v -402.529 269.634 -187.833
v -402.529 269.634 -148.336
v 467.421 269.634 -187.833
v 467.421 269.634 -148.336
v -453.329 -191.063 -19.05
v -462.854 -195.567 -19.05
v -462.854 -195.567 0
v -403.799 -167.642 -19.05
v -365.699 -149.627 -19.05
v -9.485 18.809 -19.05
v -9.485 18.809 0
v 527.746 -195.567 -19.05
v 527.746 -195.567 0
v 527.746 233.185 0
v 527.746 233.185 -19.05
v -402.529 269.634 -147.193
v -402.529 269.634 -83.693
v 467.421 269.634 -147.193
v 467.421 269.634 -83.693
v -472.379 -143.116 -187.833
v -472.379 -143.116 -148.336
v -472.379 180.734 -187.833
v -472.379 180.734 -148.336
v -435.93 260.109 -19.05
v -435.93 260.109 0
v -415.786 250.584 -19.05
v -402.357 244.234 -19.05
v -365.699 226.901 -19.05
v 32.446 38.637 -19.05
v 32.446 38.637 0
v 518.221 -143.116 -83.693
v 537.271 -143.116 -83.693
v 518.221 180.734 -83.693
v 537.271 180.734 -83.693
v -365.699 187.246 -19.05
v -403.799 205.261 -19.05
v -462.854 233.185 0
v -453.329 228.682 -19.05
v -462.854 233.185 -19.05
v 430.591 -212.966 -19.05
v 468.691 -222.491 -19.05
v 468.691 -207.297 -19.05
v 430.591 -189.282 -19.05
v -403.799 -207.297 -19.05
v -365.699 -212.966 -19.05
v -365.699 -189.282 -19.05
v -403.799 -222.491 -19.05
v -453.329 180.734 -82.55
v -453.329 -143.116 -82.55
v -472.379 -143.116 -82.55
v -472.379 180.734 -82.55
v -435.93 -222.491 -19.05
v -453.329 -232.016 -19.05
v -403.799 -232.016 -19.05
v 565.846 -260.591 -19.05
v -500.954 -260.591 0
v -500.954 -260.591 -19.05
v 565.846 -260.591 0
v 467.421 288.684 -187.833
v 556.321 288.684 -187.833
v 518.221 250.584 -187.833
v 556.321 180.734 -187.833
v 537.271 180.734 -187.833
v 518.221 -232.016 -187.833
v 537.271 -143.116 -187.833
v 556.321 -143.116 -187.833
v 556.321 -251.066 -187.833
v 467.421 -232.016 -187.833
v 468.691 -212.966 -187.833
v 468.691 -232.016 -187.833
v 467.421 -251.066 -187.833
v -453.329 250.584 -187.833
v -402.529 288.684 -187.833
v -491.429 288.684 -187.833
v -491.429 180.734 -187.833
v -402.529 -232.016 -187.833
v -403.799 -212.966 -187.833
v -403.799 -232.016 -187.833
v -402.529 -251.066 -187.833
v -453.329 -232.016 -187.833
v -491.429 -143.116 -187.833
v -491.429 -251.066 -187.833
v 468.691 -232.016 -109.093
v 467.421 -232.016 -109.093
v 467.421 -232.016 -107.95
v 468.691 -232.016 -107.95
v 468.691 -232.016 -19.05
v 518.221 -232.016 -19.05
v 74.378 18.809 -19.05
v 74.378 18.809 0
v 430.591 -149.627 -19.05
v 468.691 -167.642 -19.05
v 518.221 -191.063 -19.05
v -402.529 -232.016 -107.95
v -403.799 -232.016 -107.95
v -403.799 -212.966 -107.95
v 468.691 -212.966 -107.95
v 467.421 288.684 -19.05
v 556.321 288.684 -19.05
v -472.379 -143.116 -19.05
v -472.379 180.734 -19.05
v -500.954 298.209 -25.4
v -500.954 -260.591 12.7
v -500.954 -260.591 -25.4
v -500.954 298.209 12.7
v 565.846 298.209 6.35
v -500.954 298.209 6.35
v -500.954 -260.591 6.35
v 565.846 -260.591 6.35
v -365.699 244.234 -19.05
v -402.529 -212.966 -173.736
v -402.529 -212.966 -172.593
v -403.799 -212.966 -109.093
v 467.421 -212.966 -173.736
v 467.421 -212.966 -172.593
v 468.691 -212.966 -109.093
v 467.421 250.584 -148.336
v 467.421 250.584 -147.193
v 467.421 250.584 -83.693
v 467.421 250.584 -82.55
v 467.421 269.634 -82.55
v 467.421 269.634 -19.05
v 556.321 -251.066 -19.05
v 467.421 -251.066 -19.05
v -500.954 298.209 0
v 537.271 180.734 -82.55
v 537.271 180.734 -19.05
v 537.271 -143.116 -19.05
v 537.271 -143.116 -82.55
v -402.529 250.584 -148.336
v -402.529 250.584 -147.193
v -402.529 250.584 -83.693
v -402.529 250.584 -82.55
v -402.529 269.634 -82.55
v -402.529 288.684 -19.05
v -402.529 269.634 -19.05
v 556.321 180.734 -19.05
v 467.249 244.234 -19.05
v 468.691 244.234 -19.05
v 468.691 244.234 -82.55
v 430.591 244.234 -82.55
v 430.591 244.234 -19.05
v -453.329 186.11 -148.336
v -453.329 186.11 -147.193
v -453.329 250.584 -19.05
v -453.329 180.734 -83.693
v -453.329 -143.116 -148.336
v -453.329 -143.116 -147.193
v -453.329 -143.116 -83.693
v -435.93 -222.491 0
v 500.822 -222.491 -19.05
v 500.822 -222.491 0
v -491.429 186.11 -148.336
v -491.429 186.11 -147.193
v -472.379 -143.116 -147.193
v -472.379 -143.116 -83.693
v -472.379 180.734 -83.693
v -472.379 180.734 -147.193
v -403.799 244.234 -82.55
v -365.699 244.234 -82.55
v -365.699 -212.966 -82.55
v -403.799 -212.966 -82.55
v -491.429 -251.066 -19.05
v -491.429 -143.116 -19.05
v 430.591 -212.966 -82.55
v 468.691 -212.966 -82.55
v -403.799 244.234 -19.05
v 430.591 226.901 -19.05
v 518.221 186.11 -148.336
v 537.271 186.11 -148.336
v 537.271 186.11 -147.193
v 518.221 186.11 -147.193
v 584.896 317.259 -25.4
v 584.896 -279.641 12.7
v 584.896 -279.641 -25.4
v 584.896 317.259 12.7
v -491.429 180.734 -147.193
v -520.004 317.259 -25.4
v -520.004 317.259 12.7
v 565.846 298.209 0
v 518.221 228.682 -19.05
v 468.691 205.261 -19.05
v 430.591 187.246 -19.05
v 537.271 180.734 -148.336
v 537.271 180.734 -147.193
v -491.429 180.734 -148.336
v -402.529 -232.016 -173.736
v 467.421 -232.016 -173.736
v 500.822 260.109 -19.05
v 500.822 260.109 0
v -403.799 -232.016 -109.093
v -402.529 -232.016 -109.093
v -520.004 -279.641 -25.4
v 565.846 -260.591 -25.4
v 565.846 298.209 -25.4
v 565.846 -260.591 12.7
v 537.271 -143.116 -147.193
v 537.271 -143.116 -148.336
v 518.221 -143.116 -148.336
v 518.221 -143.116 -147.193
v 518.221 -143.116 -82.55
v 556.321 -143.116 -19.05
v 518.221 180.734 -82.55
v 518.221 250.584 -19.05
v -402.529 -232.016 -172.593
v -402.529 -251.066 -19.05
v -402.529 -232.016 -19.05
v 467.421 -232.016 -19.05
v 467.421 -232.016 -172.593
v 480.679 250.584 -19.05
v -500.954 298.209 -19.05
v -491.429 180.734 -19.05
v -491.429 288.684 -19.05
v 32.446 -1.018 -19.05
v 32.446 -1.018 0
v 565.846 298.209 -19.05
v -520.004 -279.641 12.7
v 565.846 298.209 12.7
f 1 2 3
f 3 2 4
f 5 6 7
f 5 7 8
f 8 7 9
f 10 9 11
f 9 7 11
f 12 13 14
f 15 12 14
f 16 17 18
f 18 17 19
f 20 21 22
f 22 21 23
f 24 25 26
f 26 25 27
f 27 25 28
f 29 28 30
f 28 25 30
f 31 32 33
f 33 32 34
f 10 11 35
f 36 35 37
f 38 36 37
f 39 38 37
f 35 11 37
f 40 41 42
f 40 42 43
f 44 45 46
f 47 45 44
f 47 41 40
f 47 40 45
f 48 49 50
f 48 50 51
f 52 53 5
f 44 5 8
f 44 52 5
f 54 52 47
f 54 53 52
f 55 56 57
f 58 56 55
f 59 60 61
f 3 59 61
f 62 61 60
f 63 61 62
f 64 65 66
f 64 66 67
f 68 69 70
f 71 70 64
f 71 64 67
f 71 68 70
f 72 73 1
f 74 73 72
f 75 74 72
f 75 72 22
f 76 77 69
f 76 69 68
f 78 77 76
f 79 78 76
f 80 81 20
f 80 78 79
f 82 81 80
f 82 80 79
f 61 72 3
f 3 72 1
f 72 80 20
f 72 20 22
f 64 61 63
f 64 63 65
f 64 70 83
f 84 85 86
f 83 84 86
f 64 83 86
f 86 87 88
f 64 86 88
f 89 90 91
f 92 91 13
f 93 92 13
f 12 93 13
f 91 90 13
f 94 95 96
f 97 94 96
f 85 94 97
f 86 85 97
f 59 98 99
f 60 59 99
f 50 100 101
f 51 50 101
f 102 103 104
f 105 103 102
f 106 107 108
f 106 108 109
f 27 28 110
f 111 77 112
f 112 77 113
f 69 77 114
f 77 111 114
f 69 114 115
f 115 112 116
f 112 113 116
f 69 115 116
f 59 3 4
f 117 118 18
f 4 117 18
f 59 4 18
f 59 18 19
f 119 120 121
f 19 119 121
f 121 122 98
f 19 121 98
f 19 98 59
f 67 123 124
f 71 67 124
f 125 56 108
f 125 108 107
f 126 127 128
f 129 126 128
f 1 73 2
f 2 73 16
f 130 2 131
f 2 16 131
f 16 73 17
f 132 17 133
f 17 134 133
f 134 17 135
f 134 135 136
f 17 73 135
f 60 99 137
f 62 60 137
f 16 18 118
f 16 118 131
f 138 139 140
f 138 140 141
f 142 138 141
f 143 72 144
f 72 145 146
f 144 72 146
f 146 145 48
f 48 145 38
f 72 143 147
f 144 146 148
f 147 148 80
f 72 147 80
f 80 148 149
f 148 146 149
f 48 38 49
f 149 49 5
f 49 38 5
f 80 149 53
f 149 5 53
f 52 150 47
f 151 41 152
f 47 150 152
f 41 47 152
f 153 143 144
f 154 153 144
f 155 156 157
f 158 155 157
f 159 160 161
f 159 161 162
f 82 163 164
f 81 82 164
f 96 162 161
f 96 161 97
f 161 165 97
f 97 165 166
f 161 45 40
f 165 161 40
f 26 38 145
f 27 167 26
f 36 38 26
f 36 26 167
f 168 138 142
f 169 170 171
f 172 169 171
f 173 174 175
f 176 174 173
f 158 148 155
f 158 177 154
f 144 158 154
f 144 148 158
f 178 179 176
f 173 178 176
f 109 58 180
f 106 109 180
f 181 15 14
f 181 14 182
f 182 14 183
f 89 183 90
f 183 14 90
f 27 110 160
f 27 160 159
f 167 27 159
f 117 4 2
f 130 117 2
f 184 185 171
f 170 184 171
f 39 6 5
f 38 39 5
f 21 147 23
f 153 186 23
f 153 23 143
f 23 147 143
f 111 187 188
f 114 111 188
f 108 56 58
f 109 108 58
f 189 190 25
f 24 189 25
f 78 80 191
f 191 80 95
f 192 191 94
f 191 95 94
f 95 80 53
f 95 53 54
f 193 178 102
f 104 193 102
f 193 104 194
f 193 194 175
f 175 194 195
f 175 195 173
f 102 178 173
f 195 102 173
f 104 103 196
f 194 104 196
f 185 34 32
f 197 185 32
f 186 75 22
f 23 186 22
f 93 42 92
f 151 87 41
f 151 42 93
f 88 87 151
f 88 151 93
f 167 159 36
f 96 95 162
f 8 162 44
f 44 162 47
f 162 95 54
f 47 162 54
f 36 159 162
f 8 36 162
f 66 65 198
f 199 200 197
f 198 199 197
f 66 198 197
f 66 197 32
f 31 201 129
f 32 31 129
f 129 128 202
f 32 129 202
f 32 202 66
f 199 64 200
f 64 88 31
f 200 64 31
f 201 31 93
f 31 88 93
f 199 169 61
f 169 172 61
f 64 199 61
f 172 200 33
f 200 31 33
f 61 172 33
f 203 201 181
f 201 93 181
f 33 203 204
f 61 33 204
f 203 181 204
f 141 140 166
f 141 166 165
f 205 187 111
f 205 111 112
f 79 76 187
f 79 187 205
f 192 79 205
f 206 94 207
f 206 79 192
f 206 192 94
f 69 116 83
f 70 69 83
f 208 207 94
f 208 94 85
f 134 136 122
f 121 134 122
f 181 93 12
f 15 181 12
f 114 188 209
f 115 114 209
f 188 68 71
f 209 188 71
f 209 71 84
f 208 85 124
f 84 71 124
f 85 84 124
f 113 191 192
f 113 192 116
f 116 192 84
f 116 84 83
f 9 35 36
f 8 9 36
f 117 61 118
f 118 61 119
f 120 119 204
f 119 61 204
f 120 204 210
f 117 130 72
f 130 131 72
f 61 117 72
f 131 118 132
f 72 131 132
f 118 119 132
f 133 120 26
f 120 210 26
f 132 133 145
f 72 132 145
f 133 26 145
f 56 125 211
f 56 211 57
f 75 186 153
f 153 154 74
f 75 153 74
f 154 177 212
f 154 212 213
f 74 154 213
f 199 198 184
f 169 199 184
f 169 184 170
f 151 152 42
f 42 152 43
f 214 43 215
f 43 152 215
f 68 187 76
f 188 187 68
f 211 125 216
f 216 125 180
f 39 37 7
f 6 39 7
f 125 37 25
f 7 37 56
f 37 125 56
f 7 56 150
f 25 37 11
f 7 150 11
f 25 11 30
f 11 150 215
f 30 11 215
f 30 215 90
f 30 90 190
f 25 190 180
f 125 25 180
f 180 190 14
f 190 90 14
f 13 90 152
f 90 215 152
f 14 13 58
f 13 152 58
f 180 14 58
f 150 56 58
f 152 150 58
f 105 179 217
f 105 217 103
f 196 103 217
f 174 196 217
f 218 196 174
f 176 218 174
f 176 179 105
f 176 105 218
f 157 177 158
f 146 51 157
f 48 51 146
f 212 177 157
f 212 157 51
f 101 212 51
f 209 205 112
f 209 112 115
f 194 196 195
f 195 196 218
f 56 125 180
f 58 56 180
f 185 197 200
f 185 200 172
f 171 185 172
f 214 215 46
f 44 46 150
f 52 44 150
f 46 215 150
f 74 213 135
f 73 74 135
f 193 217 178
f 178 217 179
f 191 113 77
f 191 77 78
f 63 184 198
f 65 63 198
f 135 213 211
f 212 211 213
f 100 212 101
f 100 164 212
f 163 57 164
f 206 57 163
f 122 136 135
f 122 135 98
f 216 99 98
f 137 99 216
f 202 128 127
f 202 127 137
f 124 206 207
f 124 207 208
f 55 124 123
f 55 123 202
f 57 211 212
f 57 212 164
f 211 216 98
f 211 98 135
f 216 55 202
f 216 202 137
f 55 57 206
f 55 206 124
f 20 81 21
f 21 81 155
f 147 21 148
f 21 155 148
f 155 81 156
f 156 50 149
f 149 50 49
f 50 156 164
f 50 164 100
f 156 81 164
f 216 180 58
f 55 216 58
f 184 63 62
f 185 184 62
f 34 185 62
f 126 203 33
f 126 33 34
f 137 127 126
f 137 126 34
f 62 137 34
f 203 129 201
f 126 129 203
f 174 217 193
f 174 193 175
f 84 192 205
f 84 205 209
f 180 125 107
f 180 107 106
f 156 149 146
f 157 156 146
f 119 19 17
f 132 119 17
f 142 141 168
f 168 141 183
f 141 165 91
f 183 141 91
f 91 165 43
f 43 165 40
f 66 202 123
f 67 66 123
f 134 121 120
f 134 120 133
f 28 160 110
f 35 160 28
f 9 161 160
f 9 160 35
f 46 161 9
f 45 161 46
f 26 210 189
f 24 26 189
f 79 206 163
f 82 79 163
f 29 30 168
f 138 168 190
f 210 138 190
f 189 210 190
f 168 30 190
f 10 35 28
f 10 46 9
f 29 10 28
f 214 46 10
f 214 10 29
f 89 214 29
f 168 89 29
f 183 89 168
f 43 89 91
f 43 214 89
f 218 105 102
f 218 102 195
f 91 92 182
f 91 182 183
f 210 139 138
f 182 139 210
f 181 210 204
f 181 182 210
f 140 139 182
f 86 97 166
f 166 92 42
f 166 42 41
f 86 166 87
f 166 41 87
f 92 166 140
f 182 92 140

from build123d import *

# Parameters (mm, degrees)
F0_W      = 1066.8
F0_H      = 558.8
F1_DEPTH  = 6.35
F3_W      = 1104.9
F3_H      = 596.9
F3_W_2    = 1066.8
F3_H_2    = 558.8
F4_DEPTH  = 38.1
F5_W      = 1066.8
F5_H      = 558.8
F6_DEPTH  = 19.05
F7_W      = 872.49
F7_H      = 19.05
F8_DEPTH  = 88.9
F9_W      = 38.1
F9_H      = 63.5
F10_DEPTH = 457.2
F11_W     = 19.05
F11_H     = 88.9
F12_DEPTH = 419.1
F14_DEPTH = 192.786
F15_W     = 323.85
F15_H     = 1.143
F15_W_2   = 329.2250932205
F16_DEPTH = 1219.2
F17_W     = 869.95
F17_H     = 1.143
F18_DEPTH = 25.4
F20_W     = 872.49
F20_H     = 19.05
F21_DEPTH = 128.143
F22_W     = 869.95
F22_H     = 1.143
F23_DEPTH = 25.4
F24_W     = 38.1
F24_H     = 88.9
F25_DEPTH = 226.314
F26_W     = 558.8
F26_H     = 381
F27_DEPTH = 1397


# Not quite as in the source:
# - a feature of the source that left no trace in its solid (it failed there, or was rolled back) is left out


with BuildPart() as f1:
    # F0 (on Top) → F1 (new body)
    with BuildSketch(Plane.XY):
        with Locations((32.4463618145, 18.8094943296)):
            Rectangle(F0_W, F0_H)
    extrude(amount=F1_DEPTH)


with BuildPart() as f4:
    # F3 (on offset) → F4 (new body)
    with BuildSketch(Plane.XY.offset(12.7)):
        with Locations((32.4463618145, 18.8094943296)):
            Rectangle(F3_W, F3_H)
        with Locations((32.4463618145, 18.8094943296)):
            Rectangle(F3_W_2, F3_H_2, mode=Mode.SUBTRACT)
    extrude(amount=-F4_DEPTH)


with BuildPart() as f6:
    # F5 (on face) → F6 (new body)
    with BuildSketch(Plane(origin=(0, 0, 0), x_dir=(1, 0, 0), z_dir=(0, 0, -1))):
        with Locations((32.4463618145, -18.8094943296)):
            Rectangle(F5_W, F5_H)
        Polygon((-462.8536381855, -233.1854943296), (-462.8536381855, 195.5665056704), (-9.4854419759, -18.8094943296), align=None, mode=Mode.SUBTRACT)
        Polygon((32.4463618145, -38.6370262221), (500.8223618145, -260.1094943296), (-435.9296381855, -260.1094943296), align=None, mode=Mode.SUBTRACT)
        Polygon((-435.9296381855, 222.4905056704), (500.8223618145, 222.4905056704), (32.4463618145, 1.0180375628), align=None, mode=Mode.SUBTRACT)
        Polygon((74.378165605, -18.8094943296), (527.7463618145, 195.5665056704), (527.7463618145, -233.1854943296), align=None, mode=Mode.SUBTRACT)
    extrude(amount=F6_DEPTH)

    # F7 (on face) → F8 (join)
    with BuildSketch(Plane(origin=(0, 0, -19.05), x_dir=(1, 0, 0), z_dir=(0, 0, -1))):
        with Locations((32.4463618145, 222.4905056704)):
            Rectangle(F7_W, F7_H)
    extrude(amount=F8_DEPTH)

    # F9 (on face) → F10 (join)
    with BuildSketch(Plane(origin=(0, -212.9655056704, 0), x_dir=(-1, 0, 0), z_dir=(0, 1, 0))):
        with Locations((384.7486381855, -50.8)):
            Rectangle(F9_W, F9_H)
        with Locations((-449.6413618145, -50.8)):
            Rectangle(F9_W, F9_H)
    extrude(amount=F10_DEPTH)

    # F11 (on face) → F12 (join)
    with BuildSketch(Plane(origin=(0, 0, -19.05), x_dir=(1, 0, 0), z_dir=(0, 0, -1))):
        Polygon((-402.5286381855, 251.0655056704), (-491.4286381855, 251.0655056704), (-491.4286381855, 232.0155056704), (-472.3786381855, 232.0155056704), (-402.5286381855, 232.0155056704), align=None)
        with Locations((-481.9036381855, 187.5655056704)):
            Rectangle(F11_W, F11_H)
        Polygon((-491.4286381855, -269.6344943296), (-491.4286381855, -288.6844943296), (-402.5286381855, -288.6844943296), (-402.5286381855, -269.6344943296), (-472.3786381855, -269.6344943296), align=None)
        with Locations((-481.9036381855, -225.1844943296)):
            Rectangle(F11_W, F11_H)
        Polygon((467.4213618145, -288.6844943296), (556.3213618145, -288.6844943296), (556.3213618145, -269.6344943296), (537.2713618145, -269.6344943296), (467.4213618145, -269.6344943296), align=None)
        with Locations((546.7963618145, -225.1844943296)):
            Rectangle(F11_W, F11_H)
        with Locations((546.7963618145, 187.5655056704)):
            Rectangle(F11_W, F11_H)
        Polygon((537.2713618145, 232.0155056704), (556.3213618145, 232.0155056704), (556.3213618145, 251.0655056704), (467.4213618145, 251.0655056704), (467.4213618145, 232.0155056704), align=None)
    extrude(amount=F12_DEPTH)

    # F13 (on face) → F14 (join)
    with BuildSketch(Plane(origin=(0, 0, -19.05), x_dir=(1, 0, 0), z_dir=(0, 0, -1))):
        Polygon((-453.3286381855, 232.0155056704), (-472.3786381855, 232.0155056704), (-472.3786381855, -269.6344943296), (537.2713618145, -269.6344943296), (537.2713618145, 232.0155056704), (518.2213618145, 232.0155056704), (518.2213618145, 212.9655056704), (518.2213618145, -250.5844943296), (-453.3286381855, -250.5844943296), (-453.3286381855, 212.9655056704), align=None)
    extrude(amount=F14_DEPTH)

    # F15 (on face) → F16 (cut)
    with BuildSketch(Plane.YZ.offset(537.2713618145)):
        with Locations((18.8094943296, -83.1215)):
            Rectangle(F15_W, F15_H)
        with Locations((21.4970409399, -147.7645)):
            Rectangle(F15_W_2, F15_H)
    extrude(amount=-F16_DEPTH, mode=Mode.SUBTRACT)

    # F17 (on face) → F18 (cut)
    with BuildSketch(Plane(origin=(0, 269.6344943296, 0), x_dir=(-1, 0, 0), z_dir=(0, 1, 0))):
        with Locations((-32.4463618145, -147.7645)):
            Rectangle(F17_W, F17_H)
        with Locations((-32.4463618145, -83.1215)):
            Rectangle(F17_W, F17_H)
    extrude(amount=-F18_DEPTH, mode=Mode.SUBTRACT)

    # F20 (on offset) → F21 (join)
    with BuildSketch(Plane(origin=(0, 0, -109.093), x_dir=(1, 0, 0), z_dir=(0, 0, -1))):
        with Locations((32.4463618145, 222.4905056704)):
            Rectangle(F20_W, F20_H)
    extrude(amount=F21_DEPTH)

    # F22 (on face) → F23 (cut)
    with BuildSketch(Plane.XZ.offset(232.0155056704)):
        with Locations((32.4463618145, -173.1645)):
            Rectangle(F22_W, F22_H)
    extrude(amount=-F23_DEPTH, mode=Mode.SUBTRACT)

    # F24 (on face) → F25 (join, through all)
    with BuildSketch(Plane(origin=(0, 0, -211.836), x_dir=(1, 0, 0), z_dir=(0, 0, -1))):
        with Locations((-453.3286381855, -225.1844943296)):
            Rectangle(F24_W, F24_H)
        with Locations((-453.3286381855, 187.5655056704)):
            Rectangle(F24_W, F24_H)
        with Locations((518.2213618145, -225.1844943296)):
            Rectangle(F24_W, F24_H)
        with Locations((518.2213618145, 187.5655056704)):
            Rectangle(F24_W, F24_H)
    extrude(amount=F25_DEPTH)

    # F26 (on face) → F27 (cut)
    with BuildSketch(Plane(origin=(-491.4286381855, 0, 0), x_dir=(0, -1, 0), z_dir=(-1, 0, 0))):
        with Locations((-15.6344943296, -378.333)):
            Rectangle(F26_W, F26_H)
    extrude(amount=-F27_DEPTH, mode=Mode.SUBTRACT)


solid = Compound([f1.part, f4.part, f6.part])
